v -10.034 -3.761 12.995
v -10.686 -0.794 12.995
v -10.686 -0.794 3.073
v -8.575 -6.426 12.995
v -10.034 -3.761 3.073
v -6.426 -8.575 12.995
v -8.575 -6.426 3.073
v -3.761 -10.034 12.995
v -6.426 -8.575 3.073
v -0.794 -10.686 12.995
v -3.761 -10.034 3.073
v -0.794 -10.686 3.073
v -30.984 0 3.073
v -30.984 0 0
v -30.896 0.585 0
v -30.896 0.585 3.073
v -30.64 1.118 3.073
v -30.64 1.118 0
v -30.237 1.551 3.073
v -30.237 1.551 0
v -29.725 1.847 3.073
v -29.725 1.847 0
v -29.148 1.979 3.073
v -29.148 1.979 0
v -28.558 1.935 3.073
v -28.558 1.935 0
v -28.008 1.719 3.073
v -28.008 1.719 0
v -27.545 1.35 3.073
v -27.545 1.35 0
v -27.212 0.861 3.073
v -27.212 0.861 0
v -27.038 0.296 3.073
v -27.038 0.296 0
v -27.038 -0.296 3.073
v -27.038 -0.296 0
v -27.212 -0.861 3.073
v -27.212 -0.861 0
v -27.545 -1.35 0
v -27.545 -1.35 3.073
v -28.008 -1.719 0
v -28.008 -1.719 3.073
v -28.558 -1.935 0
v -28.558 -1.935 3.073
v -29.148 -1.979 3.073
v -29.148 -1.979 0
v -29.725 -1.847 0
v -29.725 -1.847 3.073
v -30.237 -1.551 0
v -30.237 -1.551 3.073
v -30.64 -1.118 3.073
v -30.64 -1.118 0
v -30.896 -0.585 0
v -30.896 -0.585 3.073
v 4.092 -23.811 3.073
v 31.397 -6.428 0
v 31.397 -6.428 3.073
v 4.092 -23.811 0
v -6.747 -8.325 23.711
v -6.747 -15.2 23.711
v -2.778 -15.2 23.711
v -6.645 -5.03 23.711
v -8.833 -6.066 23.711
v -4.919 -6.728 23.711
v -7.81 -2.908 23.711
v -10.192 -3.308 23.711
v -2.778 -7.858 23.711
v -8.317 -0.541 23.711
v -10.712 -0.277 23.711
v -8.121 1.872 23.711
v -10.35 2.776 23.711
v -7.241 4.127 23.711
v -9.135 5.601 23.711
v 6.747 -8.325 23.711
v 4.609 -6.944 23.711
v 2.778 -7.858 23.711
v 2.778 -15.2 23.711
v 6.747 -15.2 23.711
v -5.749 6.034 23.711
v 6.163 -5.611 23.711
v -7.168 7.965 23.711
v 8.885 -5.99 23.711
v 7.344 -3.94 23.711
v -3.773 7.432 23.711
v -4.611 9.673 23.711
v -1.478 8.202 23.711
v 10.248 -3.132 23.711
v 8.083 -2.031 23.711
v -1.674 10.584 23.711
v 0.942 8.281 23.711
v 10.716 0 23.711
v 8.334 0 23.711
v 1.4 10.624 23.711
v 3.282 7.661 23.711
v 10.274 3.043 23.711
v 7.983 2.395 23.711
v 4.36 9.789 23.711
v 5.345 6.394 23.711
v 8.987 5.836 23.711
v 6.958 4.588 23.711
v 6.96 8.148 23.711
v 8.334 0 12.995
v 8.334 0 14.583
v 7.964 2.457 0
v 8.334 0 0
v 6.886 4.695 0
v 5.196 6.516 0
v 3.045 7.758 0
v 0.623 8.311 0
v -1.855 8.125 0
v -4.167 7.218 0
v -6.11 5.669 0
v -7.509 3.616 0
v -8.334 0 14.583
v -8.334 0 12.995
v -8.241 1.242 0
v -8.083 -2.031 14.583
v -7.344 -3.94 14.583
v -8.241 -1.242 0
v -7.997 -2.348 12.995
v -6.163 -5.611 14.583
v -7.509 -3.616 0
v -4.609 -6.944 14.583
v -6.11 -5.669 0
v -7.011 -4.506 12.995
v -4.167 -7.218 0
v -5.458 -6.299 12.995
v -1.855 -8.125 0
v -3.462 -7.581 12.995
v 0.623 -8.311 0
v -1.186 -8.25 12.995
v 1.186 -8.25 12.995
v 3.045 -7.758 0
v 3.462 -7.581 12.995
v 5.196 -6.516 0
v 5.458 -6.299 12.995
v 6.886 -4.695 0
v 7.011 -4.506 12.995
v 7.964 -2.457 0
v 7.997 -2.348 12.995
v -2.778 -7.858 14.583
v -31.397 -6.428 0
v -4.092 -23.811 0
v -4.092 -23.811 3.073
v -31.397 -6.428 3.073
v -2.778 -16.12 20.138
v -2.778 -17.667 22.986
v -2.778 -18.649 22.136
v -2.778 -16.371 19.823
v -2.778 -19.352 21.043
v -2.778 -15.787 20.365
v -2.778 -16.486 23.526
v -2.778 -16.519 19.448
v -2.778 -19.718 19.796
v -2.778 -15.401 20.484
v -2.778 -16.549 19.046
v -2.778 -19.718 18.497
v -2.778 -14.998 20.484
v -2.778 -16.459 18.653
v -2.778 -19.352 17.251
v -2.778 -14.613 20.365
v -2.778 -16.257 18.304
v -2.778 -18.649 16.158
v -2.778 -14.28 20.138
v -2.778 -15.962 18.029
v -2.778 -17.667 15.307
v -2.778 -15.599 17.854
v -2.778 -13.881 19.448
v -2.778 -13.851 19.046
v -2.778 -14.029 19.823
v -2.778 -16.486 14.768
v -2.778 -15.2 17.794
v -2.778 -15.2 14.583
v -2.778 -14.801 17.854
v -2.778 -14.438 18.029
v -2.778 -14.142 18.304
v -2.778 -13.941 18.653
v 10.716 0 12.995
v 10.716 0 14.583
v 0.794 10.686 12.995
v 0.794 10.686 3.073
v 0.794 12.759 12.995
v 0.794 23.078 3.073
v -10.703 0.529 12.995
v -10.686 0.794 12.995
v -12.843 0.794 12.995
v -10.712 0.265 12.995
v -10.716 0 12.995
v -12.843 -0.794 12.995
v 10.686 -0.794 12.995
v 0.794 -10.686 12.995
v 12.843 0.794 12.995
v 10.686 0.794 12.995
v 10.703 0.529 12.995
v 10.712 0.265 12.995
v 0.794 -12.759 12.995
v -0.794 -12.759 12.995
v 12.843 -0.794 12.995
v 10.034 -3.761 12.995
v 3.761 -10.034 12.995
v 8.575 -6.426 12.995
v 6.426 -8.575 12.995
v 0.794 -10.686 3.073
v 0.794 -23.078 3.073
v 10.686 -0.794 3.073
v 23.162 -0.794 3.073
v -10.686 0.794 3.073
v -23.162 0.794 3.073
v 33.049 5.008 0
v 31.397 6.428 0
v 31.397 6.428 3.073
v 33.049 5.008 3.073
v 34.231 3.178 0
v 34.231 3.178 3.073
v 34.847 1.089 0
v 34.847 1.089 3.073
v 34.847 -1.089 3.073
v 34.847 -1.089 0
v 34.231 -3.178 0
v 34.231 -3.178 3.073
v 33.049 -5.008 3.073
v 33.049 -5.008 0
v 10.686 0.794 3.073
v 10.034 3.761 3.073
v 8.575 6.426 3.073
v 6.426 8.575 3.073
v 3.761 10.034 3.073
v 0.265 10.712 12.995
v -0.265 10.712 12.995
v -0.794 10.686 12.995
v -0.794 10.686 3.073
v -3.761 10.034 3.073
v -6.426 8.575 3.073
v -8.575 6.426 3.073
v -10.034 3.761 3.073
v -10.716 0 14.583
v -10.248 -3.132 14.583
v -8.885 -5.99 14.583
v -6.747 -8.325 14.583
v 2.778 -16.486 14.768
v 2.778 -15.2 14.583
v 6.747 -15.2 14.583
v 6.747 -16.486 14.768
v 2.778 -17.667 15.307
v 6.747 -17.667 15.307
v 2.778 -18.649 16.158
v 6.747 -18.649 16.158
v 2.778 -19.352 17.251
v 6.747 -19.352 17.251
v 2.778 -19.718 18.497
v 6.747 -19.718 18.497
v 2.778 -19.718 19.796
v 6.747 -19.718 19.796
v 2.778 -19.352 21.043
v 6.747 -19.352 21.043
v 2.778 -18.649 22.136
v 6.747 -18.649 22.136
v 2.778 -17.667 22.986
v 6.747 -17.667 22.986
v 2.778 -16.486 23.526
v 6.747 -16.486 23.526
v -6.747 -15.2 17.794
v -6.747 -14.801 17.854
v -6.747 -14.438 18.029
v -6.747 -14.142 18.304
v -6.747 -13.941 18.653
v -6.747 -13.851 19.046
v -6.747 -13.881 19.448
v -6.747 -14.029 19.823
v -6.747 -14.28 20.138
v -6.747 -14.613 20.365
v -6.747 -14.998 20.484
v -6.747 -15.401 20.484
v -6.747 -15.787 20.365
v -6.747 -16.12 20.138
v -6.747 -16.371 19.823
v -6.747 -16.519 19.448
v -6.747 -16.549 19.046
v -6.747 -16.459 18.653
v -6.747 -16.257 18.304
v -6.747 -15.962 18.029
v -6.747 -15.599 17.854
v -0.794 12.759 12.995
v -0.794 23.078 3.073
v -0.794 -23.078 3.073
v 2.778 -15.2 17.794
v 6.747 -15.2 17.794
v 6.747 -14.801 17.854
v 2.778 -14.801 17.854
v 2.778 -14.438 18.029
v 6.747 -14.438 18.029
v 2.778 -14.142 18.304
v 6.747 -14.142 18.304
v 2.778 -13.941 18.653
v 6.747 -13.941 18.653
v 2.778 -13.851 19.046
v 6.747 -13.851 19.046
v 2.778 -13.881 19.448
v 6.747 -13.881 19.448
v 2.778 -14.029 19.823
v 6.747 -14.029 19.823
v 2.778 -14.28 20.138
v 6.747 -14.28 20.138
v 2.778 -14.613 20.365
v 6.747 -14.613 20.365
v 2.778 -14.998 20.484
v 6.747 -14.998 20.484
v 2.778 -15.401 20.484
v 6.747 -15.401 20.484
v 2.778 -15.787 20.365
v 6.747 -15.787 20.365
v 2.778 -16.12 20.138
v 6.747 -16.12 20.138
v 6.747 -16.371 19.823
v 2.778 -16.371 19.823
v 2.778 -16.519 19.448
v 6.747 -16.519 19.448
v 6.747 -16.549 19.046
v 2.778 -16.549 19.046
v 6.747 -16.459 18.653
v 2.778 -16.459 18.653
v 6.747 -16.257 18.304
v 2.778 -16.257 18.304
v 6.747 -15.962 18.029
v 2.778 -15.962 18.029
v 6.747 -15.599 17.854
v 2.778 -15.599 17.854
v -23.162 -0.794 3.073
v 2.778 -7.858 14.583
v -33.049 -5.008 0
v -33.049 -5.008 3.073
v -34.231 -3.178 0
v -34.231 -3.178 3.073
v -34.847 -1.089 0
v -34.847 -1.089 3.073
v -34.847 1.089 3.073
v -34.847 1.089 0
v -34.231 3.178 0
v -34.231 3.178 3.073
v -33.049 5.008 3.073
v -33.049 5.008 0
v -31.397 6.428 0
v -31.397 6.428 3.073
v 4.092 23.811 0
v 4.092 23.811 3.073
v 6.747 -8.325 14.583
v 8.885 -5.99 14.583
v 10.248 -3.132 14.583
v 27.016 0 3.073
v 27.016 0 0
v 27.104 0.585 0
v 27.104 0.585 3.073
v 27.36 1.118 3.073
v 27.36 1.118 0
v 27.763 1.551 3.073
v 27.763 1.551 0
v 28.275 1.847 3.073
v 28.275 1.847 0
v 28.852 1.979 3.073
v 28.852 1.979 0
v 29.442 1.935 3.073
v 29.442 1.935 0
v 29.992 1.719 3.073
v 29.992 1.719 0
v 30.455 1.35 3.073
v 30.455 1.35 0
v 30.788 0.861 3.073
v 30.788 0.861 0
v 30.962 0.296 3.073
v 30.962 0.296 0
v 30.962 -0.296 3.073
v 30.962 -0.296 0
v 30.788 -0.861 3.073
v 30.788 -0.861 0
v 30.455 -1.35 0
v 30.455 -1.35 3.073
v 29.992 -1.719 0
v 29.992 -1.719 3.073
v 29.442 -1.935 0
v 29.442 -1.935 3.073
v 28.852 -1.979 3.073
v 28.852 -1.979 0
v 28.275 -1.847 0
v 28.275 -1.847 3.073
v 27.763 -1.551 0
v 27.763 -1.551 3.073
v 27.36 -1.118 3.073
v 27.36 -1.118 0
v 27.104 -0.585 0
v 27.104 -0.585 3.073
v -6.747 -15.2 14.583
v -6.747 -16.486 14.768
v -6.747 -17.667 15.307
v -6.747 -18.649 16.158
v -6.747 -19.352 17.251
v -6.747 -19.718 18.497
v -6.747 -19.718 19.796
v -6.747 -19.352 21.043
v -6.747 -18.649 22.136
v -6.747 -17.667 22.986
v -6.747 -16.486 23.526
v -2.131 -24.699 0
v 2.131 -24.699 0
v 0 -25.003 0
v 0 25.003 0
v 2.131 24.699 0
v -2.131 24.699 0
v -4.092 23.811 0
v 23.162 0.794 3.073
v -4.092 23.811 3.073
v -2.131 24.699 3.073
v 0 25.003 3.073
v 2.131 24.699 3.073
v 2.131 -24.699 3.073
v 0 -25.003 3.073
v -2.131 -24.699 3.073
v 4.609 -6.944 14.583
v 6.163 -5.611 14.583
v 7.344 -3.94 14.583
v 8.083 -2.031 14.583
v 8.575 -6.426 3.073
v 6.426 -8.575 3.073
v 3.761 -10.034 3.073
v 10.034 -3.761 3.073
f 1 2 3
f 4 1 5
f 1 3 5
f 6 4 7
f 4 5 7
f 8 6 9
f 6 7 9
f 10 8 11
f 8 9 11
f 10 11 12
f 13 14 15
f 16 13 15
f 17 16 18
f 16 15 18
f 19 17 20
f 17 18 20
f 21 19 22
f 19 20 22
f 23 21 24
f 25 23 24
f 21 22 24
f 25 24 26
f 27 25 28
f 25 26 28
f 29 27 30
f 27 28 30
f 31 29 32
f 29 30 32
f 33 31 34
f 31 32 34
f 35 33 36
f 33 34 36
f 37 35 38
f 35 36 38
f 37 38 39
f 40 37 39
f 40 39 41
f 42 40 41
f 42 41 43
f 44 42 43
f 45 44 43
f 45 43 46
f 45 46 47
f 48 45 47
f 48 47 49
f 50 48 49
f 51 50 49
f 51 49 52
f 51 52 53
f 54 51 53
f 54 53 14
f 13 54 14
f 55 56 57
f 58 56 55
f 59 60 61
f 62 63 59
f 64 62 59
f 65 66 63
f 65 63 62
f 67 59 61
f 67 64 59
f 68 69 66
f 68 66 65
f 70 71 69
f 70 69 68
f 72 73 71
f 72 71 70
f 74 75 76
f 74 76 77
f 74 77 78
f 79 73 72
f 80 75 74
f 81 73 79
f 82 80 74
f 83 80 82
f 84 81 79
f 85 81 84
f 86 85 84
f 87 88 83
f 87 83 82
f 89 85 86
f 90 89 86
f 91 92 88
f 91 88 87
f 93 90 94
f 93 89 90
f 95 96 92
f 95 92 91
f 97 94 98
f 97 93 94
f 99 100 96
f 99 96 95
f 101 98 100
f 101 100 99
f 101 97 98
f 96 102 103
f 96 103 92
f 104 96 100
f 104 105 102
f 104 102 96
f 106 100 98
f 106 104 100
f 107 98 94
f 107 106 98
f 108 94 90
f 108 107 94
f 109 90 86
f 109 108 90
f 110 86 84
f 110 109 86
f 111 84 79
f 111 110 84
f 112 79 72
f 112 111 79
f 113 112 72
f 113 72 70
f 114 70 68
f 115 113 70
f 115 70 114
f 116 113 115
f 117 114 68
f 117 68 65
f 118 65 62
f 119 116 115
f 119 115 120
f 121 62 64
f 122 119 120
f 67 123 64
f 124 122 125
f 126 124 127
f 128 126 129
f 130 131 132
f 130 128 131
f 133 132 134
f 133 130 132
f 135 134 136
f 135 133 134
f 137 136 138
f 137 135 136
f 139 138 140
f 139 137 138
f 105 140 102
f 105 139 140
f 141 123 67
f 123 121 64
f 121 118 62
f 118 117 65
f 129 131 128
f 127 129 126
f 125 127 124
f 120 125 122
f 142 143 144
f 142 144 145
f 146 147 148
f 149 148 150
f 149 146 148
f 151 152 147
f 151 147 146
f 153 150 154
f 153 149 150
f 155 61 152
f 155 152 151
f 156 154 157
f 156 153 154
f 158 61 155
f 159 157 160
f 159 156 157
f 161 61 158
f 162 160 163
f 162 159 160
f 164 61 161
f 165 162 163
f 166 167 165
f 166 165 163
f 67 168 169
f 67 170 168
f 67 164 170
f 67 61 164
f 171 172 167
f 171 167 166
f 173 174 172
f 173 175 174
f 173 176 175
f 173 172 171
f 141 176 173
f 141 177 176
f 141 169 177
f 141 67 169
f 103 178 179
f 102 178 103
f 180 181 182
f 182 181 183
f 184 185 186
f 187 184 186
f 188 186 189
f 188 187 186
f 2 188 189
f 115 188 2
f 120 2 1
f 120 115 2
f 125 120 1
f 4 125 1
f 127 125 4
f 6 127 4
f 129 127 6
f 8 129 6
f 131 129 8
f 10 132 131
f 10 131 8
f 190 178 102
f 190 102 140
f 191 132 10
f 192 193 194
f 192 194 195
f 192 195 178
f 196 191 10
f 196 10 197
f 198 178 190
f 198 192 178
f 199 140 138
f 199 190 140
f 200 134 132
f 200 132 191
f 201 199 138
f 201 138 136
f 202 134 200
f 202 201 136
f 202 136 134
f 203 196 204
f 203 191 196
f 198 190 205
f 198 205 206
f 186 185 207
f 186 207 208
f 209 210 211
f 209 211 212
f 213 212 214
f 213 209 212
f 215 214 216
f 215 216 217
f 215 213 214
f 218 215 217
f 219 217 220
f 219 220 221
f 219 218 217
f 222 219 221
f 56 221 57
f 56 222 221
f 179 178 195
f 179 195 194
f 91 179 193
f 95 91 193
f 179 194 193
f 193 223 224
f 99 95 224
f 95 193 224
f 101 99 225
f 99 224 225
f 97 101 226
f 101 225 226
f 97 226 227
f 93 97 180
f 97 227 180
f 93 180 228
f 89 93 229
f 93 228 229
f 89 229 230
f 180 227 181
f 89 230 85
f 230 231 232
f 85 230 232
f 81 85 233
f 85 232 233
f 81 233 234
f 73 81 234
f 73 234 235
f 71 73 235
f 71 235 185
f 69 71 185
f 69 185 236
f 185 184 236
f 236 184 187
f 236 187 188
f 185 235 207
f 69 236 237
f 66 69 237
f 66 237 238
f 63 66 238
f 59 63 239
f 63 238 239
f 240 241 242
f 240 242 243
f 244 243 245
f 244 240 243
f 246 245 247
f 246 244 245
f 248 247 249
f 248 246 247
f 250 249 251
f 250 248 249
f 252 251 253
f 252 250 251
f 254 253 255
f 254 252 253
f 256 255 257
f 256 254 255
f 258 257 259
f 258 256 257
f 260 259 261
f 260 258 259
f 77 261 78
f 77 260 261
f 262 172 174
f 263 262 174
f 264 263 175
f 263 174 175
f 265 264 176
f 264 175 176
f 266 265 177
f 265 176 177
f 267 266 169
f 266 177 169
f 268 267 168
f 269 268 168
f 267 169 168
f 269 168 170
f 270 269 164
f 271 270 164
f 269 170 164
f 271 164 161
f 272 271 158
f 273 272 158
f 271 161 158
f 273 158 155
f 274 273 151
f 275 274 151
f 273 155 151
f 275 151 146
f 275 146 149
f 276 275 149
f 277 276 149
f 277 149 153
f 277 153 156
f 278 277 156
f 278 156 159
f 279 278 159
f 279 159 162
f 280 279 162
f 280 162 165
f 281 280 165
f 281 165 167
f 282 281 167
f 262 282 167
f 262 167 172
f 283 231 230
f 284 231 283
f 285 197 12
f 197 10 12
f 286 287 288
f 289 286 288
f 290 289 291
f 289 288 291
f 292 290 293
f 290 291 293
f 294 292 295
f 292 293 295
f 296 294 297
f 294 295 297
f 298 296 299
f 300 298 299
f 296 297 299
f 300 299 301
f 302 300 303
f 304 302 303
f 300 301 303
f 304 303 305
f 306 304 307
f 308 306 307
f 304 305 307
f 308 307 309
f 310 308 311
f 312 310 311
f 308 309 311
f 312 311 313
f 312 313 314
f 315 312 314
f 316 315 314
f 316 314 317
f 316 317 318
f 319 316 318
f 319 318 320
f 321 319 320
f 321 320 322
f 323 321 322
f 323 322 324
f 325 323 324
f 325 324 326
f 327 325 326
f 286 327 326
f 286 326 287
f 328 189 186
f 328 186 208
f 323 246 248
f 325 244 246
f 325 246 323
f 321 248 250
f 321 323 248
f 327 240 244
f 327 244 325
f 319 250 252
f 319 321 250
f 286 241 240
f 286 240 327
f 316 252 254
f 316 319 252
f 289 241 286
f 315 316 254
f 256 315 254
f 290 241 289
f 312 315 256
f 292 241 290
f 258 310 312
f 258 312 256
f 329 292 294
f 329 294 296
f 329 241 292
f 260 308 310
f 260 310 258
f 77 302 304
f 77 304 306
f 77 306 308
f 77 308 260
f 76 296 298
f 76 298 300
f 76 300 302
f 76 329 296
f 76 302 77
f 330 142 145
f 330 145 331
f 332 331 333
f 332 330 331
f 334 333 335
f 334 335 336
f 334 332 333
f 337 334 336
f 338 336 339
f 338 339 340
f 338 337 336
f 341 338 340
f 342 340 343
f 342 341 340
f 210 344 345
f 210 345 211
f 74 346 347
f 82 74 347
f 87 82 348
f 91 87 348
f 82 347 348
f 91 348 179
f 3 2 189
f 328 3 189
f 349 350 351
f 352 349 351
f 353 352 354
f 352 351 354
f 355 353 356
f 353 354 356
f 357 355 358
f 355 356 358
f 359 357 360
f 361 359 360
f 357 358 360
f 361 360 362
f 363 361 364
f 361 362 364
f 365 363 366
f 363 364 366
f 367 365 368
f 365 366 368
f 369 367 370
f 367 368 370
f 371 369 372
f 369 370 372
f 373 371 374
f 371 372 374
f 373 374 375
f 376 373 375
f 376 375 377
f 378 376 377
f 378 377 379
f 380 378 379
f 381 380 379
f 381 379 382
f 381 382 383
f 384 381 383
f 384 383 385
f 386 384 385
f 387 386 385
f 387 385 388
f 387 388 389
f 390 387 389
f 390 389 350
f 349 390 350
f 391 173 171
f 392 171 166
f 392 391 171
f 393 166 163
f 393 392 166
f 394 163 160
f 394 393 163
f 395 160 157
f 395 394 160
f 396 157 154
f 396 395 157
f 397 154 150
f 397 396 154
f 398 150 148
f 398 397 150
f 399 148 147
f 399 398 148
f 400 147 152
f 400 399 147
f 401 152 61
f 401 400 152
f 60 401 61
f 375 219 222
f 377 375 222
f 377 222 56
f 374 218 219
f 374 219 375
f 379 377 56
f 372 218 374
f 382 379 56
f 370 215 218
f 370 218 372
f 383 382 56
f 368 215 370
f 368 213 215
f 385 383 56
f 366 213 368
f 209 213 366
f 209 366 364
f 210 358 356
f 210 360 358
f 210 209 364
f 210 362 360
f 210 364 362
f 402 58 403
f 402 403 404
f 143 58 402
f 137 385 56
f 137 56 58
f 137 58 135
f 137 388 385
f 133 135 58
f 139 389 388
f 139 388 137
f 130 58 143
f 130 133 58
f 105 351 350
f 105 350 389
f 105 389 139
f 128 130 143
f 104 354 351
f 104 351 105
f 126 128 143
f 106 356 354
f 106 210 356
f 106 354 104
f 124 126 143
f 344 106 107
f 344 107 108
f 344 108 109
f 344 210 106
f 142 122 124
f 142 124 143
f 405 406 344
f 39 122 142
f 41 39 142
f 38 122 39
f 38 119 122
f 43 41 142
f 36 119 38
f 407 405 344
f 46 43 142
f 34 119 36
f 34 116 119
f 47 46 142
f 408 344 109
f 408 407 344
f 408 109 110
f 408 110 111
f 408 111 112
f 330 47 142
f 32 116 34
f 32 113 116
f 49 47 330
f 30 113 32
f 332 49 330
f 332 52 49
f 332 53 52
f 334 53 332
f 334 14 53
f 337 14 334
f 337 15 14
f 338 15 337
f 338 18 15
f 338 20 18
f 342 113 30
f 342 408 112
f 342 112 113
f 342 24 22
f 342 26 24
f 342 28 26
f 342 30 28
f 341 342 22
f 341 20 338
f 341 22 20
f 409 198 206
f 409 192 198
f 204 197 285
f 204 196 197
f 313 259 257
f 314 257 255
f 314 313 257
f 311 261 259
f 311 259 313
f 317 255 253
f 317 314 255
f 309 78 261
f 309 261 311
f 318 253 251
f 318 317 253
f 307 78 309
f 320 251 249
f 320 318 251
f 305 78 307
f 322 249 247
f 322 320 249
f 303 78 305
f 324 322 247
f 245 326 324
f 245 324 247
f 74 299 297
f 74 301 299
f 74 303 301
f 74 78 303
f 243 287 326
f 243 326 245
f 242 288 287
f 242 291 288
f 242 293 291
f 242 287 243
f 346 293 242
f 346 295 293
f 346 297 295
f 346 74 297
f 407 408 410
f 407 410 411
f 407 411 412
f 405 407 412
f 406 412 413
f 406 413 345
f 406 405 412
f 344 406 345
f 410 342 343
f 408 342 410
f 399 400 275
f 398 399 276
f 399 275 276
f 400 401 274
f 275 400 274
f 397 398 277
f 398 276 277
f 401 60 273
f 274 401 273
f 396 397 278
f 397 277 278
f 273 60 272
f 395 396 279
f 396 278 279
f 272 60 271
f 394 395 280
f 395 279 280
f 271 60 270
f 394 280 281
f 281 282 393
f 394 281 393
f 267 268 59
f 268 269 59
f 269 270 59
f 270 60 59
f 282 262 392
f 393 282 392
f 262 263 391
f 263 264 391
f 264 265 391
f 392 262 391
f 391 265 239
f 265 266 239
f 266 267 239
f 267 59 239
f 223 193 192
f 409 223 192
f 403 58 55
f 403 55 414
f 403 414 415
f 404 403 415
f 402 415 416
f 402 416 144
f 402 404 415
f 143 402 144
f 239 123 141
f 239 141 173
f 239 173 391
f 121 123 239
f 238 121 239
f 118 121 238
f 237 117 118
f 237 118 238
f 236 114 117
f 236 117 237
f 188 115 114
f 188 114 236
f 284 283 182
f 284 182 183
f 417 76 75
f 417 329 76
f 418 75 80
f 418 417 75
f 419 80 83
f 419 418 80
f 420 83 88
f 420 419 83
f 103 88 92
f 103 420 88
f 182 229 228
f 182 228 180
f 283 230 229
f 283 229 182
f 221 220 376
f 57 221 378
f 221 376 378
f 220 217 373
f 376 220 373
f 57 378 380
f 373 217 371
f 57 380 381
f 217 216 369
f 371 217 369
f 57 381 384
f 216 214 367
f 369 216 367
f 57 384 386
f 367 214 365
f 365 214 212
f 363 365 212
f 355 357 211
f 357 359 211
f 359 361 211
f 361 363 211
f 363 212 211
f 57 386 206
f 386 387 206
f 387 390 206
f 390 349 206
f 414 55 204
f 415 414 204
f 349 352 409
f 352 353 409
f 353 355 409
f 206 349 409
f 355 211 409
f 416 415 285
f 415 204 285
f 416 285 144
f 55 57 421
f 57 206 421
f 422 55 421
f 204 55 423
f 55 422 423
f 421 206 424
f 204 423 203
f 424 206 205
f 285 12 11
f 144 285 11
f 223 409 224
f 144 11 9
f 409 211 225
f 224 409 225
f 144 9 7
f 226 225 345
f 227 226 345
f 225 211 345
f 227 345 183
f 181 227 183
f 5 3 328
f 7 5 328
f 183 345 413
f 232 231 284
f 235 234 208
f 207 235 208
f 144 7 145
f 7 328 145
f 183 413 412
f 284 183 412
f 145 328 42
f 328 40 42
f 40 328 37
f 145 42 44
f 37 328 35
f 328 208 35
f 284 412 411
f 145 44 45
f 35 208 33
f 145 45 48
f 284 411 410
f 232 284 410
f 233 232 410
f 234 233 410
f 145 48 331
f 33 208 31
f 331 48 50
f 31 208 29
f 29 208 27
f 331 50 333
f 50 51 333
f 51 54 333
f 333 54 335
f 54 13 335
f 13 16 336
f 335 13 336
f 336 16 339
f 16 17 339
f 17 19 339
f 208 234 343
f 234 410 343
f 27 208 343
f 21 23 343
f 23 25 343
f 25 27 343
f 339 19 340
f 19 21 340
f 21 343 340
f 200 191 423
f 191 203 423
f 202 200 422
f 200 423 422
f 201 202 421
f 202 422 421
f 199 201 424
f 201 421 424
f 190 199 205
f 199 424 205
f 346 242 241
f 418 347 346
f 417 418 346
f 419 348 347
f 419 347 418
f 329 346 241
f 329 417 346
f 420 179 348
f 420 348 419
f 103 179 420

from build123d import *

# Parameters (mm, degrees)
SKETCH1_R             = 8.334375
BOSS_EXTRUDE1_DEPTH   = 3.0734
F_6_CLEARANCE_HOLE1_D = 3.96875
SKETCH4_R             = 10.715625
SKETCH4_R_2           = 8.334375
BOSS_EXTRUDE2_DEPTH   = 20.6375
CUT_EXTRUDE1_DEPTH    = 26.003125
SKETCH7_W             = 3.96875
SKETCH7_H             = 9.128125
BOSS_EXTRUDE3_DEPTH   = 11.90625
CUT_EXTRUDE2_DEPTH    = 42.671875
F_2_CLEARANCE_HOLE1_D = 2.7051
BOSS_EXTRUDE7_DEPTH   = 0.79375
BOSS_EXTRUDE8_DEPTH   = 0.79375


with BuildPart() as part:
    # Sketch1 → Boss-Extrude1 (new body)
    with BuildSketch(Plane.XY):
        with BuildLine():
            Line((-31.397200262, 6.427931006), (-4.092200262, 23.811056006))
            ThreePointArc((-4.092200262, 23.811056006), (0, 25.003125), (4.092200262, 23.811056006))
            Line((4.092200262, 23.811056006), (31.397200262, 6.427931006))
            ThreePointArc((31.397200262, 6.427931006), (34.925, 0), (31.397200262, -6.427931006))
            Line((31.397200262, -6.427931006), (4.092200262, -23.811056006))
            ThreePointArc((4.092200262, -23.811056006), (0, -25.003125), (-4.092200262, -23.811056006))
            Line((-4.092200262, -23.811056006), (-31.397200262, -6.427931006))
            ThreePointArc((-31.397200262, -6.427931006), (-34.925, 0), (-31.397200262, 6.427931006))
        make_face()
        Circle(SKETCH1_R, mode=Mode.SUBTRACT)
    extrude(amount=BOSS_EXTRUDE1_DEPTH)

    # #6 Clearance Hole1 (through all)
    with Locations(Plane.XY.offset(3.0734)):
        with Locations((-29, 0), (29, 0)):
            Hole(F_6_CLEARANCE_HOLE1_D / 2)

    # Sketch4 → Boss-Extrude2 (add)
    with BuildSketch(Plane.XY.offset(3.0734)):
        Circle(SKETCH4_R)
        Circle(SKETCH4_R_2, mode=Mode.SUBTRACT)
    extrude(amount=BOSS_EXTRUDE2_DEPTH)

    # Sketch6 → Cut-Extrude1 (cut, through all)
    with BuildSketch(Plane(origin=(0, 0, 0), x_dir=(1, 0, 0), z_dir=(0, 1, 0))):
        Polygon((-10.715625, -12.995275), (10.715625, -12.995275), (10.715625, -14.582775), (2.778125, -14.582775), (2.778125, -23.7109), (-2.778125, -23.7109), (-2.778125, -14.582775), (-10.715625, -14.582775), align=None)
    extrude(amount=-CUT_EXTRUDE1_DEPTH, mode=Mode.SUBTRACT)

    # Sketch7 → Boss-Extrude3 (add)
    with BuildSketch(Plane(origin=(0, -7.857724106, 0), x_dir=(1, 0, 0), z_dir=(0, 1, 0))):
        with Locations((-4.7625, -19.1468375)):
            Rectangle(SKETCH7_W, SKETCH7_H)
        with Locations((4.7625, -19.1468375)):
            Rectangle(SKETCH7_W, SKETCH7_H)
    extrude(amount=-BOSS_EXTRUDE3_DEPTH)

    # Sketch8 → Cut-Extrude2 (cut, through all)
    with BuildSketch(Plane.ZY.offset(6.746875)):
        with BuildLine():
            Line((23.7109, -15.199911606), (23.7109, -21.050205541))
            Line((23.7109, -21.050205541), (14.582775, -21.050205541))
            Line((14.582775, -21.050205541), (14.582775, -15.199911606))
            ThreePointArc((14.582775, -15.199911606), (19.1468375, -19.763974106), (23.7109, -15.199911606))
        make_face()
    extrude(amount=-CUT_EXTRUDE2_DEPTH, mode=Mode.SUBTRACT)

    # #2 Clearance Hole1 (through all)
    with Locations(Plane.ZY.offset(6.746875)):
        with Locations((19.1468375, -15.199911606)):
            Hole(F_2_CLEARANCE_HOLE1_D / 2)

    # Sketch11 → Boss-Extrude7 (add, symmetric)
    with BuildSketch(Plane(origin=(0, 0, 0), x_dir=(1, 0, 0), z_dir=(0, 1, 0))):
        Polygon((-10.461625, -12.995275), (-12.842875, -12.995275), (-23.161625, -3.0734), (-10.461625, -3.0734), align=None)
        Polygon((23.161625, -3.0734), (10.461625, -3.0734), (10.461625, -12.995275), (12.842875, -12.995275), align=None)
    extrude(amount=BOSS_EXTRUDE7_DEPTH, both=True)

    # Sketch13 → Boss-Extrude8 (add, symmetric)
    with BuildSketch(Plane(origin=(0, 0, 0), x_dir=(0, 0, -1), z_dir=(1, 0, 0))):
        Polygon((-12.995275, 10.377516644), (-12.995275, 12.758766644), (-3.0734, 23.077516644), (-3.0734, 10.377516644), align=None)
        Polygon((-3.0734, -23.077516644), (-3.0734, -10.377516644), (-12.995275, -10.377516644), (-12.995275, -12.758766644), align=None)
    extrude(amount=BOSS_EXTRUDE8_DEPTH, both=True)


solid = part.part
